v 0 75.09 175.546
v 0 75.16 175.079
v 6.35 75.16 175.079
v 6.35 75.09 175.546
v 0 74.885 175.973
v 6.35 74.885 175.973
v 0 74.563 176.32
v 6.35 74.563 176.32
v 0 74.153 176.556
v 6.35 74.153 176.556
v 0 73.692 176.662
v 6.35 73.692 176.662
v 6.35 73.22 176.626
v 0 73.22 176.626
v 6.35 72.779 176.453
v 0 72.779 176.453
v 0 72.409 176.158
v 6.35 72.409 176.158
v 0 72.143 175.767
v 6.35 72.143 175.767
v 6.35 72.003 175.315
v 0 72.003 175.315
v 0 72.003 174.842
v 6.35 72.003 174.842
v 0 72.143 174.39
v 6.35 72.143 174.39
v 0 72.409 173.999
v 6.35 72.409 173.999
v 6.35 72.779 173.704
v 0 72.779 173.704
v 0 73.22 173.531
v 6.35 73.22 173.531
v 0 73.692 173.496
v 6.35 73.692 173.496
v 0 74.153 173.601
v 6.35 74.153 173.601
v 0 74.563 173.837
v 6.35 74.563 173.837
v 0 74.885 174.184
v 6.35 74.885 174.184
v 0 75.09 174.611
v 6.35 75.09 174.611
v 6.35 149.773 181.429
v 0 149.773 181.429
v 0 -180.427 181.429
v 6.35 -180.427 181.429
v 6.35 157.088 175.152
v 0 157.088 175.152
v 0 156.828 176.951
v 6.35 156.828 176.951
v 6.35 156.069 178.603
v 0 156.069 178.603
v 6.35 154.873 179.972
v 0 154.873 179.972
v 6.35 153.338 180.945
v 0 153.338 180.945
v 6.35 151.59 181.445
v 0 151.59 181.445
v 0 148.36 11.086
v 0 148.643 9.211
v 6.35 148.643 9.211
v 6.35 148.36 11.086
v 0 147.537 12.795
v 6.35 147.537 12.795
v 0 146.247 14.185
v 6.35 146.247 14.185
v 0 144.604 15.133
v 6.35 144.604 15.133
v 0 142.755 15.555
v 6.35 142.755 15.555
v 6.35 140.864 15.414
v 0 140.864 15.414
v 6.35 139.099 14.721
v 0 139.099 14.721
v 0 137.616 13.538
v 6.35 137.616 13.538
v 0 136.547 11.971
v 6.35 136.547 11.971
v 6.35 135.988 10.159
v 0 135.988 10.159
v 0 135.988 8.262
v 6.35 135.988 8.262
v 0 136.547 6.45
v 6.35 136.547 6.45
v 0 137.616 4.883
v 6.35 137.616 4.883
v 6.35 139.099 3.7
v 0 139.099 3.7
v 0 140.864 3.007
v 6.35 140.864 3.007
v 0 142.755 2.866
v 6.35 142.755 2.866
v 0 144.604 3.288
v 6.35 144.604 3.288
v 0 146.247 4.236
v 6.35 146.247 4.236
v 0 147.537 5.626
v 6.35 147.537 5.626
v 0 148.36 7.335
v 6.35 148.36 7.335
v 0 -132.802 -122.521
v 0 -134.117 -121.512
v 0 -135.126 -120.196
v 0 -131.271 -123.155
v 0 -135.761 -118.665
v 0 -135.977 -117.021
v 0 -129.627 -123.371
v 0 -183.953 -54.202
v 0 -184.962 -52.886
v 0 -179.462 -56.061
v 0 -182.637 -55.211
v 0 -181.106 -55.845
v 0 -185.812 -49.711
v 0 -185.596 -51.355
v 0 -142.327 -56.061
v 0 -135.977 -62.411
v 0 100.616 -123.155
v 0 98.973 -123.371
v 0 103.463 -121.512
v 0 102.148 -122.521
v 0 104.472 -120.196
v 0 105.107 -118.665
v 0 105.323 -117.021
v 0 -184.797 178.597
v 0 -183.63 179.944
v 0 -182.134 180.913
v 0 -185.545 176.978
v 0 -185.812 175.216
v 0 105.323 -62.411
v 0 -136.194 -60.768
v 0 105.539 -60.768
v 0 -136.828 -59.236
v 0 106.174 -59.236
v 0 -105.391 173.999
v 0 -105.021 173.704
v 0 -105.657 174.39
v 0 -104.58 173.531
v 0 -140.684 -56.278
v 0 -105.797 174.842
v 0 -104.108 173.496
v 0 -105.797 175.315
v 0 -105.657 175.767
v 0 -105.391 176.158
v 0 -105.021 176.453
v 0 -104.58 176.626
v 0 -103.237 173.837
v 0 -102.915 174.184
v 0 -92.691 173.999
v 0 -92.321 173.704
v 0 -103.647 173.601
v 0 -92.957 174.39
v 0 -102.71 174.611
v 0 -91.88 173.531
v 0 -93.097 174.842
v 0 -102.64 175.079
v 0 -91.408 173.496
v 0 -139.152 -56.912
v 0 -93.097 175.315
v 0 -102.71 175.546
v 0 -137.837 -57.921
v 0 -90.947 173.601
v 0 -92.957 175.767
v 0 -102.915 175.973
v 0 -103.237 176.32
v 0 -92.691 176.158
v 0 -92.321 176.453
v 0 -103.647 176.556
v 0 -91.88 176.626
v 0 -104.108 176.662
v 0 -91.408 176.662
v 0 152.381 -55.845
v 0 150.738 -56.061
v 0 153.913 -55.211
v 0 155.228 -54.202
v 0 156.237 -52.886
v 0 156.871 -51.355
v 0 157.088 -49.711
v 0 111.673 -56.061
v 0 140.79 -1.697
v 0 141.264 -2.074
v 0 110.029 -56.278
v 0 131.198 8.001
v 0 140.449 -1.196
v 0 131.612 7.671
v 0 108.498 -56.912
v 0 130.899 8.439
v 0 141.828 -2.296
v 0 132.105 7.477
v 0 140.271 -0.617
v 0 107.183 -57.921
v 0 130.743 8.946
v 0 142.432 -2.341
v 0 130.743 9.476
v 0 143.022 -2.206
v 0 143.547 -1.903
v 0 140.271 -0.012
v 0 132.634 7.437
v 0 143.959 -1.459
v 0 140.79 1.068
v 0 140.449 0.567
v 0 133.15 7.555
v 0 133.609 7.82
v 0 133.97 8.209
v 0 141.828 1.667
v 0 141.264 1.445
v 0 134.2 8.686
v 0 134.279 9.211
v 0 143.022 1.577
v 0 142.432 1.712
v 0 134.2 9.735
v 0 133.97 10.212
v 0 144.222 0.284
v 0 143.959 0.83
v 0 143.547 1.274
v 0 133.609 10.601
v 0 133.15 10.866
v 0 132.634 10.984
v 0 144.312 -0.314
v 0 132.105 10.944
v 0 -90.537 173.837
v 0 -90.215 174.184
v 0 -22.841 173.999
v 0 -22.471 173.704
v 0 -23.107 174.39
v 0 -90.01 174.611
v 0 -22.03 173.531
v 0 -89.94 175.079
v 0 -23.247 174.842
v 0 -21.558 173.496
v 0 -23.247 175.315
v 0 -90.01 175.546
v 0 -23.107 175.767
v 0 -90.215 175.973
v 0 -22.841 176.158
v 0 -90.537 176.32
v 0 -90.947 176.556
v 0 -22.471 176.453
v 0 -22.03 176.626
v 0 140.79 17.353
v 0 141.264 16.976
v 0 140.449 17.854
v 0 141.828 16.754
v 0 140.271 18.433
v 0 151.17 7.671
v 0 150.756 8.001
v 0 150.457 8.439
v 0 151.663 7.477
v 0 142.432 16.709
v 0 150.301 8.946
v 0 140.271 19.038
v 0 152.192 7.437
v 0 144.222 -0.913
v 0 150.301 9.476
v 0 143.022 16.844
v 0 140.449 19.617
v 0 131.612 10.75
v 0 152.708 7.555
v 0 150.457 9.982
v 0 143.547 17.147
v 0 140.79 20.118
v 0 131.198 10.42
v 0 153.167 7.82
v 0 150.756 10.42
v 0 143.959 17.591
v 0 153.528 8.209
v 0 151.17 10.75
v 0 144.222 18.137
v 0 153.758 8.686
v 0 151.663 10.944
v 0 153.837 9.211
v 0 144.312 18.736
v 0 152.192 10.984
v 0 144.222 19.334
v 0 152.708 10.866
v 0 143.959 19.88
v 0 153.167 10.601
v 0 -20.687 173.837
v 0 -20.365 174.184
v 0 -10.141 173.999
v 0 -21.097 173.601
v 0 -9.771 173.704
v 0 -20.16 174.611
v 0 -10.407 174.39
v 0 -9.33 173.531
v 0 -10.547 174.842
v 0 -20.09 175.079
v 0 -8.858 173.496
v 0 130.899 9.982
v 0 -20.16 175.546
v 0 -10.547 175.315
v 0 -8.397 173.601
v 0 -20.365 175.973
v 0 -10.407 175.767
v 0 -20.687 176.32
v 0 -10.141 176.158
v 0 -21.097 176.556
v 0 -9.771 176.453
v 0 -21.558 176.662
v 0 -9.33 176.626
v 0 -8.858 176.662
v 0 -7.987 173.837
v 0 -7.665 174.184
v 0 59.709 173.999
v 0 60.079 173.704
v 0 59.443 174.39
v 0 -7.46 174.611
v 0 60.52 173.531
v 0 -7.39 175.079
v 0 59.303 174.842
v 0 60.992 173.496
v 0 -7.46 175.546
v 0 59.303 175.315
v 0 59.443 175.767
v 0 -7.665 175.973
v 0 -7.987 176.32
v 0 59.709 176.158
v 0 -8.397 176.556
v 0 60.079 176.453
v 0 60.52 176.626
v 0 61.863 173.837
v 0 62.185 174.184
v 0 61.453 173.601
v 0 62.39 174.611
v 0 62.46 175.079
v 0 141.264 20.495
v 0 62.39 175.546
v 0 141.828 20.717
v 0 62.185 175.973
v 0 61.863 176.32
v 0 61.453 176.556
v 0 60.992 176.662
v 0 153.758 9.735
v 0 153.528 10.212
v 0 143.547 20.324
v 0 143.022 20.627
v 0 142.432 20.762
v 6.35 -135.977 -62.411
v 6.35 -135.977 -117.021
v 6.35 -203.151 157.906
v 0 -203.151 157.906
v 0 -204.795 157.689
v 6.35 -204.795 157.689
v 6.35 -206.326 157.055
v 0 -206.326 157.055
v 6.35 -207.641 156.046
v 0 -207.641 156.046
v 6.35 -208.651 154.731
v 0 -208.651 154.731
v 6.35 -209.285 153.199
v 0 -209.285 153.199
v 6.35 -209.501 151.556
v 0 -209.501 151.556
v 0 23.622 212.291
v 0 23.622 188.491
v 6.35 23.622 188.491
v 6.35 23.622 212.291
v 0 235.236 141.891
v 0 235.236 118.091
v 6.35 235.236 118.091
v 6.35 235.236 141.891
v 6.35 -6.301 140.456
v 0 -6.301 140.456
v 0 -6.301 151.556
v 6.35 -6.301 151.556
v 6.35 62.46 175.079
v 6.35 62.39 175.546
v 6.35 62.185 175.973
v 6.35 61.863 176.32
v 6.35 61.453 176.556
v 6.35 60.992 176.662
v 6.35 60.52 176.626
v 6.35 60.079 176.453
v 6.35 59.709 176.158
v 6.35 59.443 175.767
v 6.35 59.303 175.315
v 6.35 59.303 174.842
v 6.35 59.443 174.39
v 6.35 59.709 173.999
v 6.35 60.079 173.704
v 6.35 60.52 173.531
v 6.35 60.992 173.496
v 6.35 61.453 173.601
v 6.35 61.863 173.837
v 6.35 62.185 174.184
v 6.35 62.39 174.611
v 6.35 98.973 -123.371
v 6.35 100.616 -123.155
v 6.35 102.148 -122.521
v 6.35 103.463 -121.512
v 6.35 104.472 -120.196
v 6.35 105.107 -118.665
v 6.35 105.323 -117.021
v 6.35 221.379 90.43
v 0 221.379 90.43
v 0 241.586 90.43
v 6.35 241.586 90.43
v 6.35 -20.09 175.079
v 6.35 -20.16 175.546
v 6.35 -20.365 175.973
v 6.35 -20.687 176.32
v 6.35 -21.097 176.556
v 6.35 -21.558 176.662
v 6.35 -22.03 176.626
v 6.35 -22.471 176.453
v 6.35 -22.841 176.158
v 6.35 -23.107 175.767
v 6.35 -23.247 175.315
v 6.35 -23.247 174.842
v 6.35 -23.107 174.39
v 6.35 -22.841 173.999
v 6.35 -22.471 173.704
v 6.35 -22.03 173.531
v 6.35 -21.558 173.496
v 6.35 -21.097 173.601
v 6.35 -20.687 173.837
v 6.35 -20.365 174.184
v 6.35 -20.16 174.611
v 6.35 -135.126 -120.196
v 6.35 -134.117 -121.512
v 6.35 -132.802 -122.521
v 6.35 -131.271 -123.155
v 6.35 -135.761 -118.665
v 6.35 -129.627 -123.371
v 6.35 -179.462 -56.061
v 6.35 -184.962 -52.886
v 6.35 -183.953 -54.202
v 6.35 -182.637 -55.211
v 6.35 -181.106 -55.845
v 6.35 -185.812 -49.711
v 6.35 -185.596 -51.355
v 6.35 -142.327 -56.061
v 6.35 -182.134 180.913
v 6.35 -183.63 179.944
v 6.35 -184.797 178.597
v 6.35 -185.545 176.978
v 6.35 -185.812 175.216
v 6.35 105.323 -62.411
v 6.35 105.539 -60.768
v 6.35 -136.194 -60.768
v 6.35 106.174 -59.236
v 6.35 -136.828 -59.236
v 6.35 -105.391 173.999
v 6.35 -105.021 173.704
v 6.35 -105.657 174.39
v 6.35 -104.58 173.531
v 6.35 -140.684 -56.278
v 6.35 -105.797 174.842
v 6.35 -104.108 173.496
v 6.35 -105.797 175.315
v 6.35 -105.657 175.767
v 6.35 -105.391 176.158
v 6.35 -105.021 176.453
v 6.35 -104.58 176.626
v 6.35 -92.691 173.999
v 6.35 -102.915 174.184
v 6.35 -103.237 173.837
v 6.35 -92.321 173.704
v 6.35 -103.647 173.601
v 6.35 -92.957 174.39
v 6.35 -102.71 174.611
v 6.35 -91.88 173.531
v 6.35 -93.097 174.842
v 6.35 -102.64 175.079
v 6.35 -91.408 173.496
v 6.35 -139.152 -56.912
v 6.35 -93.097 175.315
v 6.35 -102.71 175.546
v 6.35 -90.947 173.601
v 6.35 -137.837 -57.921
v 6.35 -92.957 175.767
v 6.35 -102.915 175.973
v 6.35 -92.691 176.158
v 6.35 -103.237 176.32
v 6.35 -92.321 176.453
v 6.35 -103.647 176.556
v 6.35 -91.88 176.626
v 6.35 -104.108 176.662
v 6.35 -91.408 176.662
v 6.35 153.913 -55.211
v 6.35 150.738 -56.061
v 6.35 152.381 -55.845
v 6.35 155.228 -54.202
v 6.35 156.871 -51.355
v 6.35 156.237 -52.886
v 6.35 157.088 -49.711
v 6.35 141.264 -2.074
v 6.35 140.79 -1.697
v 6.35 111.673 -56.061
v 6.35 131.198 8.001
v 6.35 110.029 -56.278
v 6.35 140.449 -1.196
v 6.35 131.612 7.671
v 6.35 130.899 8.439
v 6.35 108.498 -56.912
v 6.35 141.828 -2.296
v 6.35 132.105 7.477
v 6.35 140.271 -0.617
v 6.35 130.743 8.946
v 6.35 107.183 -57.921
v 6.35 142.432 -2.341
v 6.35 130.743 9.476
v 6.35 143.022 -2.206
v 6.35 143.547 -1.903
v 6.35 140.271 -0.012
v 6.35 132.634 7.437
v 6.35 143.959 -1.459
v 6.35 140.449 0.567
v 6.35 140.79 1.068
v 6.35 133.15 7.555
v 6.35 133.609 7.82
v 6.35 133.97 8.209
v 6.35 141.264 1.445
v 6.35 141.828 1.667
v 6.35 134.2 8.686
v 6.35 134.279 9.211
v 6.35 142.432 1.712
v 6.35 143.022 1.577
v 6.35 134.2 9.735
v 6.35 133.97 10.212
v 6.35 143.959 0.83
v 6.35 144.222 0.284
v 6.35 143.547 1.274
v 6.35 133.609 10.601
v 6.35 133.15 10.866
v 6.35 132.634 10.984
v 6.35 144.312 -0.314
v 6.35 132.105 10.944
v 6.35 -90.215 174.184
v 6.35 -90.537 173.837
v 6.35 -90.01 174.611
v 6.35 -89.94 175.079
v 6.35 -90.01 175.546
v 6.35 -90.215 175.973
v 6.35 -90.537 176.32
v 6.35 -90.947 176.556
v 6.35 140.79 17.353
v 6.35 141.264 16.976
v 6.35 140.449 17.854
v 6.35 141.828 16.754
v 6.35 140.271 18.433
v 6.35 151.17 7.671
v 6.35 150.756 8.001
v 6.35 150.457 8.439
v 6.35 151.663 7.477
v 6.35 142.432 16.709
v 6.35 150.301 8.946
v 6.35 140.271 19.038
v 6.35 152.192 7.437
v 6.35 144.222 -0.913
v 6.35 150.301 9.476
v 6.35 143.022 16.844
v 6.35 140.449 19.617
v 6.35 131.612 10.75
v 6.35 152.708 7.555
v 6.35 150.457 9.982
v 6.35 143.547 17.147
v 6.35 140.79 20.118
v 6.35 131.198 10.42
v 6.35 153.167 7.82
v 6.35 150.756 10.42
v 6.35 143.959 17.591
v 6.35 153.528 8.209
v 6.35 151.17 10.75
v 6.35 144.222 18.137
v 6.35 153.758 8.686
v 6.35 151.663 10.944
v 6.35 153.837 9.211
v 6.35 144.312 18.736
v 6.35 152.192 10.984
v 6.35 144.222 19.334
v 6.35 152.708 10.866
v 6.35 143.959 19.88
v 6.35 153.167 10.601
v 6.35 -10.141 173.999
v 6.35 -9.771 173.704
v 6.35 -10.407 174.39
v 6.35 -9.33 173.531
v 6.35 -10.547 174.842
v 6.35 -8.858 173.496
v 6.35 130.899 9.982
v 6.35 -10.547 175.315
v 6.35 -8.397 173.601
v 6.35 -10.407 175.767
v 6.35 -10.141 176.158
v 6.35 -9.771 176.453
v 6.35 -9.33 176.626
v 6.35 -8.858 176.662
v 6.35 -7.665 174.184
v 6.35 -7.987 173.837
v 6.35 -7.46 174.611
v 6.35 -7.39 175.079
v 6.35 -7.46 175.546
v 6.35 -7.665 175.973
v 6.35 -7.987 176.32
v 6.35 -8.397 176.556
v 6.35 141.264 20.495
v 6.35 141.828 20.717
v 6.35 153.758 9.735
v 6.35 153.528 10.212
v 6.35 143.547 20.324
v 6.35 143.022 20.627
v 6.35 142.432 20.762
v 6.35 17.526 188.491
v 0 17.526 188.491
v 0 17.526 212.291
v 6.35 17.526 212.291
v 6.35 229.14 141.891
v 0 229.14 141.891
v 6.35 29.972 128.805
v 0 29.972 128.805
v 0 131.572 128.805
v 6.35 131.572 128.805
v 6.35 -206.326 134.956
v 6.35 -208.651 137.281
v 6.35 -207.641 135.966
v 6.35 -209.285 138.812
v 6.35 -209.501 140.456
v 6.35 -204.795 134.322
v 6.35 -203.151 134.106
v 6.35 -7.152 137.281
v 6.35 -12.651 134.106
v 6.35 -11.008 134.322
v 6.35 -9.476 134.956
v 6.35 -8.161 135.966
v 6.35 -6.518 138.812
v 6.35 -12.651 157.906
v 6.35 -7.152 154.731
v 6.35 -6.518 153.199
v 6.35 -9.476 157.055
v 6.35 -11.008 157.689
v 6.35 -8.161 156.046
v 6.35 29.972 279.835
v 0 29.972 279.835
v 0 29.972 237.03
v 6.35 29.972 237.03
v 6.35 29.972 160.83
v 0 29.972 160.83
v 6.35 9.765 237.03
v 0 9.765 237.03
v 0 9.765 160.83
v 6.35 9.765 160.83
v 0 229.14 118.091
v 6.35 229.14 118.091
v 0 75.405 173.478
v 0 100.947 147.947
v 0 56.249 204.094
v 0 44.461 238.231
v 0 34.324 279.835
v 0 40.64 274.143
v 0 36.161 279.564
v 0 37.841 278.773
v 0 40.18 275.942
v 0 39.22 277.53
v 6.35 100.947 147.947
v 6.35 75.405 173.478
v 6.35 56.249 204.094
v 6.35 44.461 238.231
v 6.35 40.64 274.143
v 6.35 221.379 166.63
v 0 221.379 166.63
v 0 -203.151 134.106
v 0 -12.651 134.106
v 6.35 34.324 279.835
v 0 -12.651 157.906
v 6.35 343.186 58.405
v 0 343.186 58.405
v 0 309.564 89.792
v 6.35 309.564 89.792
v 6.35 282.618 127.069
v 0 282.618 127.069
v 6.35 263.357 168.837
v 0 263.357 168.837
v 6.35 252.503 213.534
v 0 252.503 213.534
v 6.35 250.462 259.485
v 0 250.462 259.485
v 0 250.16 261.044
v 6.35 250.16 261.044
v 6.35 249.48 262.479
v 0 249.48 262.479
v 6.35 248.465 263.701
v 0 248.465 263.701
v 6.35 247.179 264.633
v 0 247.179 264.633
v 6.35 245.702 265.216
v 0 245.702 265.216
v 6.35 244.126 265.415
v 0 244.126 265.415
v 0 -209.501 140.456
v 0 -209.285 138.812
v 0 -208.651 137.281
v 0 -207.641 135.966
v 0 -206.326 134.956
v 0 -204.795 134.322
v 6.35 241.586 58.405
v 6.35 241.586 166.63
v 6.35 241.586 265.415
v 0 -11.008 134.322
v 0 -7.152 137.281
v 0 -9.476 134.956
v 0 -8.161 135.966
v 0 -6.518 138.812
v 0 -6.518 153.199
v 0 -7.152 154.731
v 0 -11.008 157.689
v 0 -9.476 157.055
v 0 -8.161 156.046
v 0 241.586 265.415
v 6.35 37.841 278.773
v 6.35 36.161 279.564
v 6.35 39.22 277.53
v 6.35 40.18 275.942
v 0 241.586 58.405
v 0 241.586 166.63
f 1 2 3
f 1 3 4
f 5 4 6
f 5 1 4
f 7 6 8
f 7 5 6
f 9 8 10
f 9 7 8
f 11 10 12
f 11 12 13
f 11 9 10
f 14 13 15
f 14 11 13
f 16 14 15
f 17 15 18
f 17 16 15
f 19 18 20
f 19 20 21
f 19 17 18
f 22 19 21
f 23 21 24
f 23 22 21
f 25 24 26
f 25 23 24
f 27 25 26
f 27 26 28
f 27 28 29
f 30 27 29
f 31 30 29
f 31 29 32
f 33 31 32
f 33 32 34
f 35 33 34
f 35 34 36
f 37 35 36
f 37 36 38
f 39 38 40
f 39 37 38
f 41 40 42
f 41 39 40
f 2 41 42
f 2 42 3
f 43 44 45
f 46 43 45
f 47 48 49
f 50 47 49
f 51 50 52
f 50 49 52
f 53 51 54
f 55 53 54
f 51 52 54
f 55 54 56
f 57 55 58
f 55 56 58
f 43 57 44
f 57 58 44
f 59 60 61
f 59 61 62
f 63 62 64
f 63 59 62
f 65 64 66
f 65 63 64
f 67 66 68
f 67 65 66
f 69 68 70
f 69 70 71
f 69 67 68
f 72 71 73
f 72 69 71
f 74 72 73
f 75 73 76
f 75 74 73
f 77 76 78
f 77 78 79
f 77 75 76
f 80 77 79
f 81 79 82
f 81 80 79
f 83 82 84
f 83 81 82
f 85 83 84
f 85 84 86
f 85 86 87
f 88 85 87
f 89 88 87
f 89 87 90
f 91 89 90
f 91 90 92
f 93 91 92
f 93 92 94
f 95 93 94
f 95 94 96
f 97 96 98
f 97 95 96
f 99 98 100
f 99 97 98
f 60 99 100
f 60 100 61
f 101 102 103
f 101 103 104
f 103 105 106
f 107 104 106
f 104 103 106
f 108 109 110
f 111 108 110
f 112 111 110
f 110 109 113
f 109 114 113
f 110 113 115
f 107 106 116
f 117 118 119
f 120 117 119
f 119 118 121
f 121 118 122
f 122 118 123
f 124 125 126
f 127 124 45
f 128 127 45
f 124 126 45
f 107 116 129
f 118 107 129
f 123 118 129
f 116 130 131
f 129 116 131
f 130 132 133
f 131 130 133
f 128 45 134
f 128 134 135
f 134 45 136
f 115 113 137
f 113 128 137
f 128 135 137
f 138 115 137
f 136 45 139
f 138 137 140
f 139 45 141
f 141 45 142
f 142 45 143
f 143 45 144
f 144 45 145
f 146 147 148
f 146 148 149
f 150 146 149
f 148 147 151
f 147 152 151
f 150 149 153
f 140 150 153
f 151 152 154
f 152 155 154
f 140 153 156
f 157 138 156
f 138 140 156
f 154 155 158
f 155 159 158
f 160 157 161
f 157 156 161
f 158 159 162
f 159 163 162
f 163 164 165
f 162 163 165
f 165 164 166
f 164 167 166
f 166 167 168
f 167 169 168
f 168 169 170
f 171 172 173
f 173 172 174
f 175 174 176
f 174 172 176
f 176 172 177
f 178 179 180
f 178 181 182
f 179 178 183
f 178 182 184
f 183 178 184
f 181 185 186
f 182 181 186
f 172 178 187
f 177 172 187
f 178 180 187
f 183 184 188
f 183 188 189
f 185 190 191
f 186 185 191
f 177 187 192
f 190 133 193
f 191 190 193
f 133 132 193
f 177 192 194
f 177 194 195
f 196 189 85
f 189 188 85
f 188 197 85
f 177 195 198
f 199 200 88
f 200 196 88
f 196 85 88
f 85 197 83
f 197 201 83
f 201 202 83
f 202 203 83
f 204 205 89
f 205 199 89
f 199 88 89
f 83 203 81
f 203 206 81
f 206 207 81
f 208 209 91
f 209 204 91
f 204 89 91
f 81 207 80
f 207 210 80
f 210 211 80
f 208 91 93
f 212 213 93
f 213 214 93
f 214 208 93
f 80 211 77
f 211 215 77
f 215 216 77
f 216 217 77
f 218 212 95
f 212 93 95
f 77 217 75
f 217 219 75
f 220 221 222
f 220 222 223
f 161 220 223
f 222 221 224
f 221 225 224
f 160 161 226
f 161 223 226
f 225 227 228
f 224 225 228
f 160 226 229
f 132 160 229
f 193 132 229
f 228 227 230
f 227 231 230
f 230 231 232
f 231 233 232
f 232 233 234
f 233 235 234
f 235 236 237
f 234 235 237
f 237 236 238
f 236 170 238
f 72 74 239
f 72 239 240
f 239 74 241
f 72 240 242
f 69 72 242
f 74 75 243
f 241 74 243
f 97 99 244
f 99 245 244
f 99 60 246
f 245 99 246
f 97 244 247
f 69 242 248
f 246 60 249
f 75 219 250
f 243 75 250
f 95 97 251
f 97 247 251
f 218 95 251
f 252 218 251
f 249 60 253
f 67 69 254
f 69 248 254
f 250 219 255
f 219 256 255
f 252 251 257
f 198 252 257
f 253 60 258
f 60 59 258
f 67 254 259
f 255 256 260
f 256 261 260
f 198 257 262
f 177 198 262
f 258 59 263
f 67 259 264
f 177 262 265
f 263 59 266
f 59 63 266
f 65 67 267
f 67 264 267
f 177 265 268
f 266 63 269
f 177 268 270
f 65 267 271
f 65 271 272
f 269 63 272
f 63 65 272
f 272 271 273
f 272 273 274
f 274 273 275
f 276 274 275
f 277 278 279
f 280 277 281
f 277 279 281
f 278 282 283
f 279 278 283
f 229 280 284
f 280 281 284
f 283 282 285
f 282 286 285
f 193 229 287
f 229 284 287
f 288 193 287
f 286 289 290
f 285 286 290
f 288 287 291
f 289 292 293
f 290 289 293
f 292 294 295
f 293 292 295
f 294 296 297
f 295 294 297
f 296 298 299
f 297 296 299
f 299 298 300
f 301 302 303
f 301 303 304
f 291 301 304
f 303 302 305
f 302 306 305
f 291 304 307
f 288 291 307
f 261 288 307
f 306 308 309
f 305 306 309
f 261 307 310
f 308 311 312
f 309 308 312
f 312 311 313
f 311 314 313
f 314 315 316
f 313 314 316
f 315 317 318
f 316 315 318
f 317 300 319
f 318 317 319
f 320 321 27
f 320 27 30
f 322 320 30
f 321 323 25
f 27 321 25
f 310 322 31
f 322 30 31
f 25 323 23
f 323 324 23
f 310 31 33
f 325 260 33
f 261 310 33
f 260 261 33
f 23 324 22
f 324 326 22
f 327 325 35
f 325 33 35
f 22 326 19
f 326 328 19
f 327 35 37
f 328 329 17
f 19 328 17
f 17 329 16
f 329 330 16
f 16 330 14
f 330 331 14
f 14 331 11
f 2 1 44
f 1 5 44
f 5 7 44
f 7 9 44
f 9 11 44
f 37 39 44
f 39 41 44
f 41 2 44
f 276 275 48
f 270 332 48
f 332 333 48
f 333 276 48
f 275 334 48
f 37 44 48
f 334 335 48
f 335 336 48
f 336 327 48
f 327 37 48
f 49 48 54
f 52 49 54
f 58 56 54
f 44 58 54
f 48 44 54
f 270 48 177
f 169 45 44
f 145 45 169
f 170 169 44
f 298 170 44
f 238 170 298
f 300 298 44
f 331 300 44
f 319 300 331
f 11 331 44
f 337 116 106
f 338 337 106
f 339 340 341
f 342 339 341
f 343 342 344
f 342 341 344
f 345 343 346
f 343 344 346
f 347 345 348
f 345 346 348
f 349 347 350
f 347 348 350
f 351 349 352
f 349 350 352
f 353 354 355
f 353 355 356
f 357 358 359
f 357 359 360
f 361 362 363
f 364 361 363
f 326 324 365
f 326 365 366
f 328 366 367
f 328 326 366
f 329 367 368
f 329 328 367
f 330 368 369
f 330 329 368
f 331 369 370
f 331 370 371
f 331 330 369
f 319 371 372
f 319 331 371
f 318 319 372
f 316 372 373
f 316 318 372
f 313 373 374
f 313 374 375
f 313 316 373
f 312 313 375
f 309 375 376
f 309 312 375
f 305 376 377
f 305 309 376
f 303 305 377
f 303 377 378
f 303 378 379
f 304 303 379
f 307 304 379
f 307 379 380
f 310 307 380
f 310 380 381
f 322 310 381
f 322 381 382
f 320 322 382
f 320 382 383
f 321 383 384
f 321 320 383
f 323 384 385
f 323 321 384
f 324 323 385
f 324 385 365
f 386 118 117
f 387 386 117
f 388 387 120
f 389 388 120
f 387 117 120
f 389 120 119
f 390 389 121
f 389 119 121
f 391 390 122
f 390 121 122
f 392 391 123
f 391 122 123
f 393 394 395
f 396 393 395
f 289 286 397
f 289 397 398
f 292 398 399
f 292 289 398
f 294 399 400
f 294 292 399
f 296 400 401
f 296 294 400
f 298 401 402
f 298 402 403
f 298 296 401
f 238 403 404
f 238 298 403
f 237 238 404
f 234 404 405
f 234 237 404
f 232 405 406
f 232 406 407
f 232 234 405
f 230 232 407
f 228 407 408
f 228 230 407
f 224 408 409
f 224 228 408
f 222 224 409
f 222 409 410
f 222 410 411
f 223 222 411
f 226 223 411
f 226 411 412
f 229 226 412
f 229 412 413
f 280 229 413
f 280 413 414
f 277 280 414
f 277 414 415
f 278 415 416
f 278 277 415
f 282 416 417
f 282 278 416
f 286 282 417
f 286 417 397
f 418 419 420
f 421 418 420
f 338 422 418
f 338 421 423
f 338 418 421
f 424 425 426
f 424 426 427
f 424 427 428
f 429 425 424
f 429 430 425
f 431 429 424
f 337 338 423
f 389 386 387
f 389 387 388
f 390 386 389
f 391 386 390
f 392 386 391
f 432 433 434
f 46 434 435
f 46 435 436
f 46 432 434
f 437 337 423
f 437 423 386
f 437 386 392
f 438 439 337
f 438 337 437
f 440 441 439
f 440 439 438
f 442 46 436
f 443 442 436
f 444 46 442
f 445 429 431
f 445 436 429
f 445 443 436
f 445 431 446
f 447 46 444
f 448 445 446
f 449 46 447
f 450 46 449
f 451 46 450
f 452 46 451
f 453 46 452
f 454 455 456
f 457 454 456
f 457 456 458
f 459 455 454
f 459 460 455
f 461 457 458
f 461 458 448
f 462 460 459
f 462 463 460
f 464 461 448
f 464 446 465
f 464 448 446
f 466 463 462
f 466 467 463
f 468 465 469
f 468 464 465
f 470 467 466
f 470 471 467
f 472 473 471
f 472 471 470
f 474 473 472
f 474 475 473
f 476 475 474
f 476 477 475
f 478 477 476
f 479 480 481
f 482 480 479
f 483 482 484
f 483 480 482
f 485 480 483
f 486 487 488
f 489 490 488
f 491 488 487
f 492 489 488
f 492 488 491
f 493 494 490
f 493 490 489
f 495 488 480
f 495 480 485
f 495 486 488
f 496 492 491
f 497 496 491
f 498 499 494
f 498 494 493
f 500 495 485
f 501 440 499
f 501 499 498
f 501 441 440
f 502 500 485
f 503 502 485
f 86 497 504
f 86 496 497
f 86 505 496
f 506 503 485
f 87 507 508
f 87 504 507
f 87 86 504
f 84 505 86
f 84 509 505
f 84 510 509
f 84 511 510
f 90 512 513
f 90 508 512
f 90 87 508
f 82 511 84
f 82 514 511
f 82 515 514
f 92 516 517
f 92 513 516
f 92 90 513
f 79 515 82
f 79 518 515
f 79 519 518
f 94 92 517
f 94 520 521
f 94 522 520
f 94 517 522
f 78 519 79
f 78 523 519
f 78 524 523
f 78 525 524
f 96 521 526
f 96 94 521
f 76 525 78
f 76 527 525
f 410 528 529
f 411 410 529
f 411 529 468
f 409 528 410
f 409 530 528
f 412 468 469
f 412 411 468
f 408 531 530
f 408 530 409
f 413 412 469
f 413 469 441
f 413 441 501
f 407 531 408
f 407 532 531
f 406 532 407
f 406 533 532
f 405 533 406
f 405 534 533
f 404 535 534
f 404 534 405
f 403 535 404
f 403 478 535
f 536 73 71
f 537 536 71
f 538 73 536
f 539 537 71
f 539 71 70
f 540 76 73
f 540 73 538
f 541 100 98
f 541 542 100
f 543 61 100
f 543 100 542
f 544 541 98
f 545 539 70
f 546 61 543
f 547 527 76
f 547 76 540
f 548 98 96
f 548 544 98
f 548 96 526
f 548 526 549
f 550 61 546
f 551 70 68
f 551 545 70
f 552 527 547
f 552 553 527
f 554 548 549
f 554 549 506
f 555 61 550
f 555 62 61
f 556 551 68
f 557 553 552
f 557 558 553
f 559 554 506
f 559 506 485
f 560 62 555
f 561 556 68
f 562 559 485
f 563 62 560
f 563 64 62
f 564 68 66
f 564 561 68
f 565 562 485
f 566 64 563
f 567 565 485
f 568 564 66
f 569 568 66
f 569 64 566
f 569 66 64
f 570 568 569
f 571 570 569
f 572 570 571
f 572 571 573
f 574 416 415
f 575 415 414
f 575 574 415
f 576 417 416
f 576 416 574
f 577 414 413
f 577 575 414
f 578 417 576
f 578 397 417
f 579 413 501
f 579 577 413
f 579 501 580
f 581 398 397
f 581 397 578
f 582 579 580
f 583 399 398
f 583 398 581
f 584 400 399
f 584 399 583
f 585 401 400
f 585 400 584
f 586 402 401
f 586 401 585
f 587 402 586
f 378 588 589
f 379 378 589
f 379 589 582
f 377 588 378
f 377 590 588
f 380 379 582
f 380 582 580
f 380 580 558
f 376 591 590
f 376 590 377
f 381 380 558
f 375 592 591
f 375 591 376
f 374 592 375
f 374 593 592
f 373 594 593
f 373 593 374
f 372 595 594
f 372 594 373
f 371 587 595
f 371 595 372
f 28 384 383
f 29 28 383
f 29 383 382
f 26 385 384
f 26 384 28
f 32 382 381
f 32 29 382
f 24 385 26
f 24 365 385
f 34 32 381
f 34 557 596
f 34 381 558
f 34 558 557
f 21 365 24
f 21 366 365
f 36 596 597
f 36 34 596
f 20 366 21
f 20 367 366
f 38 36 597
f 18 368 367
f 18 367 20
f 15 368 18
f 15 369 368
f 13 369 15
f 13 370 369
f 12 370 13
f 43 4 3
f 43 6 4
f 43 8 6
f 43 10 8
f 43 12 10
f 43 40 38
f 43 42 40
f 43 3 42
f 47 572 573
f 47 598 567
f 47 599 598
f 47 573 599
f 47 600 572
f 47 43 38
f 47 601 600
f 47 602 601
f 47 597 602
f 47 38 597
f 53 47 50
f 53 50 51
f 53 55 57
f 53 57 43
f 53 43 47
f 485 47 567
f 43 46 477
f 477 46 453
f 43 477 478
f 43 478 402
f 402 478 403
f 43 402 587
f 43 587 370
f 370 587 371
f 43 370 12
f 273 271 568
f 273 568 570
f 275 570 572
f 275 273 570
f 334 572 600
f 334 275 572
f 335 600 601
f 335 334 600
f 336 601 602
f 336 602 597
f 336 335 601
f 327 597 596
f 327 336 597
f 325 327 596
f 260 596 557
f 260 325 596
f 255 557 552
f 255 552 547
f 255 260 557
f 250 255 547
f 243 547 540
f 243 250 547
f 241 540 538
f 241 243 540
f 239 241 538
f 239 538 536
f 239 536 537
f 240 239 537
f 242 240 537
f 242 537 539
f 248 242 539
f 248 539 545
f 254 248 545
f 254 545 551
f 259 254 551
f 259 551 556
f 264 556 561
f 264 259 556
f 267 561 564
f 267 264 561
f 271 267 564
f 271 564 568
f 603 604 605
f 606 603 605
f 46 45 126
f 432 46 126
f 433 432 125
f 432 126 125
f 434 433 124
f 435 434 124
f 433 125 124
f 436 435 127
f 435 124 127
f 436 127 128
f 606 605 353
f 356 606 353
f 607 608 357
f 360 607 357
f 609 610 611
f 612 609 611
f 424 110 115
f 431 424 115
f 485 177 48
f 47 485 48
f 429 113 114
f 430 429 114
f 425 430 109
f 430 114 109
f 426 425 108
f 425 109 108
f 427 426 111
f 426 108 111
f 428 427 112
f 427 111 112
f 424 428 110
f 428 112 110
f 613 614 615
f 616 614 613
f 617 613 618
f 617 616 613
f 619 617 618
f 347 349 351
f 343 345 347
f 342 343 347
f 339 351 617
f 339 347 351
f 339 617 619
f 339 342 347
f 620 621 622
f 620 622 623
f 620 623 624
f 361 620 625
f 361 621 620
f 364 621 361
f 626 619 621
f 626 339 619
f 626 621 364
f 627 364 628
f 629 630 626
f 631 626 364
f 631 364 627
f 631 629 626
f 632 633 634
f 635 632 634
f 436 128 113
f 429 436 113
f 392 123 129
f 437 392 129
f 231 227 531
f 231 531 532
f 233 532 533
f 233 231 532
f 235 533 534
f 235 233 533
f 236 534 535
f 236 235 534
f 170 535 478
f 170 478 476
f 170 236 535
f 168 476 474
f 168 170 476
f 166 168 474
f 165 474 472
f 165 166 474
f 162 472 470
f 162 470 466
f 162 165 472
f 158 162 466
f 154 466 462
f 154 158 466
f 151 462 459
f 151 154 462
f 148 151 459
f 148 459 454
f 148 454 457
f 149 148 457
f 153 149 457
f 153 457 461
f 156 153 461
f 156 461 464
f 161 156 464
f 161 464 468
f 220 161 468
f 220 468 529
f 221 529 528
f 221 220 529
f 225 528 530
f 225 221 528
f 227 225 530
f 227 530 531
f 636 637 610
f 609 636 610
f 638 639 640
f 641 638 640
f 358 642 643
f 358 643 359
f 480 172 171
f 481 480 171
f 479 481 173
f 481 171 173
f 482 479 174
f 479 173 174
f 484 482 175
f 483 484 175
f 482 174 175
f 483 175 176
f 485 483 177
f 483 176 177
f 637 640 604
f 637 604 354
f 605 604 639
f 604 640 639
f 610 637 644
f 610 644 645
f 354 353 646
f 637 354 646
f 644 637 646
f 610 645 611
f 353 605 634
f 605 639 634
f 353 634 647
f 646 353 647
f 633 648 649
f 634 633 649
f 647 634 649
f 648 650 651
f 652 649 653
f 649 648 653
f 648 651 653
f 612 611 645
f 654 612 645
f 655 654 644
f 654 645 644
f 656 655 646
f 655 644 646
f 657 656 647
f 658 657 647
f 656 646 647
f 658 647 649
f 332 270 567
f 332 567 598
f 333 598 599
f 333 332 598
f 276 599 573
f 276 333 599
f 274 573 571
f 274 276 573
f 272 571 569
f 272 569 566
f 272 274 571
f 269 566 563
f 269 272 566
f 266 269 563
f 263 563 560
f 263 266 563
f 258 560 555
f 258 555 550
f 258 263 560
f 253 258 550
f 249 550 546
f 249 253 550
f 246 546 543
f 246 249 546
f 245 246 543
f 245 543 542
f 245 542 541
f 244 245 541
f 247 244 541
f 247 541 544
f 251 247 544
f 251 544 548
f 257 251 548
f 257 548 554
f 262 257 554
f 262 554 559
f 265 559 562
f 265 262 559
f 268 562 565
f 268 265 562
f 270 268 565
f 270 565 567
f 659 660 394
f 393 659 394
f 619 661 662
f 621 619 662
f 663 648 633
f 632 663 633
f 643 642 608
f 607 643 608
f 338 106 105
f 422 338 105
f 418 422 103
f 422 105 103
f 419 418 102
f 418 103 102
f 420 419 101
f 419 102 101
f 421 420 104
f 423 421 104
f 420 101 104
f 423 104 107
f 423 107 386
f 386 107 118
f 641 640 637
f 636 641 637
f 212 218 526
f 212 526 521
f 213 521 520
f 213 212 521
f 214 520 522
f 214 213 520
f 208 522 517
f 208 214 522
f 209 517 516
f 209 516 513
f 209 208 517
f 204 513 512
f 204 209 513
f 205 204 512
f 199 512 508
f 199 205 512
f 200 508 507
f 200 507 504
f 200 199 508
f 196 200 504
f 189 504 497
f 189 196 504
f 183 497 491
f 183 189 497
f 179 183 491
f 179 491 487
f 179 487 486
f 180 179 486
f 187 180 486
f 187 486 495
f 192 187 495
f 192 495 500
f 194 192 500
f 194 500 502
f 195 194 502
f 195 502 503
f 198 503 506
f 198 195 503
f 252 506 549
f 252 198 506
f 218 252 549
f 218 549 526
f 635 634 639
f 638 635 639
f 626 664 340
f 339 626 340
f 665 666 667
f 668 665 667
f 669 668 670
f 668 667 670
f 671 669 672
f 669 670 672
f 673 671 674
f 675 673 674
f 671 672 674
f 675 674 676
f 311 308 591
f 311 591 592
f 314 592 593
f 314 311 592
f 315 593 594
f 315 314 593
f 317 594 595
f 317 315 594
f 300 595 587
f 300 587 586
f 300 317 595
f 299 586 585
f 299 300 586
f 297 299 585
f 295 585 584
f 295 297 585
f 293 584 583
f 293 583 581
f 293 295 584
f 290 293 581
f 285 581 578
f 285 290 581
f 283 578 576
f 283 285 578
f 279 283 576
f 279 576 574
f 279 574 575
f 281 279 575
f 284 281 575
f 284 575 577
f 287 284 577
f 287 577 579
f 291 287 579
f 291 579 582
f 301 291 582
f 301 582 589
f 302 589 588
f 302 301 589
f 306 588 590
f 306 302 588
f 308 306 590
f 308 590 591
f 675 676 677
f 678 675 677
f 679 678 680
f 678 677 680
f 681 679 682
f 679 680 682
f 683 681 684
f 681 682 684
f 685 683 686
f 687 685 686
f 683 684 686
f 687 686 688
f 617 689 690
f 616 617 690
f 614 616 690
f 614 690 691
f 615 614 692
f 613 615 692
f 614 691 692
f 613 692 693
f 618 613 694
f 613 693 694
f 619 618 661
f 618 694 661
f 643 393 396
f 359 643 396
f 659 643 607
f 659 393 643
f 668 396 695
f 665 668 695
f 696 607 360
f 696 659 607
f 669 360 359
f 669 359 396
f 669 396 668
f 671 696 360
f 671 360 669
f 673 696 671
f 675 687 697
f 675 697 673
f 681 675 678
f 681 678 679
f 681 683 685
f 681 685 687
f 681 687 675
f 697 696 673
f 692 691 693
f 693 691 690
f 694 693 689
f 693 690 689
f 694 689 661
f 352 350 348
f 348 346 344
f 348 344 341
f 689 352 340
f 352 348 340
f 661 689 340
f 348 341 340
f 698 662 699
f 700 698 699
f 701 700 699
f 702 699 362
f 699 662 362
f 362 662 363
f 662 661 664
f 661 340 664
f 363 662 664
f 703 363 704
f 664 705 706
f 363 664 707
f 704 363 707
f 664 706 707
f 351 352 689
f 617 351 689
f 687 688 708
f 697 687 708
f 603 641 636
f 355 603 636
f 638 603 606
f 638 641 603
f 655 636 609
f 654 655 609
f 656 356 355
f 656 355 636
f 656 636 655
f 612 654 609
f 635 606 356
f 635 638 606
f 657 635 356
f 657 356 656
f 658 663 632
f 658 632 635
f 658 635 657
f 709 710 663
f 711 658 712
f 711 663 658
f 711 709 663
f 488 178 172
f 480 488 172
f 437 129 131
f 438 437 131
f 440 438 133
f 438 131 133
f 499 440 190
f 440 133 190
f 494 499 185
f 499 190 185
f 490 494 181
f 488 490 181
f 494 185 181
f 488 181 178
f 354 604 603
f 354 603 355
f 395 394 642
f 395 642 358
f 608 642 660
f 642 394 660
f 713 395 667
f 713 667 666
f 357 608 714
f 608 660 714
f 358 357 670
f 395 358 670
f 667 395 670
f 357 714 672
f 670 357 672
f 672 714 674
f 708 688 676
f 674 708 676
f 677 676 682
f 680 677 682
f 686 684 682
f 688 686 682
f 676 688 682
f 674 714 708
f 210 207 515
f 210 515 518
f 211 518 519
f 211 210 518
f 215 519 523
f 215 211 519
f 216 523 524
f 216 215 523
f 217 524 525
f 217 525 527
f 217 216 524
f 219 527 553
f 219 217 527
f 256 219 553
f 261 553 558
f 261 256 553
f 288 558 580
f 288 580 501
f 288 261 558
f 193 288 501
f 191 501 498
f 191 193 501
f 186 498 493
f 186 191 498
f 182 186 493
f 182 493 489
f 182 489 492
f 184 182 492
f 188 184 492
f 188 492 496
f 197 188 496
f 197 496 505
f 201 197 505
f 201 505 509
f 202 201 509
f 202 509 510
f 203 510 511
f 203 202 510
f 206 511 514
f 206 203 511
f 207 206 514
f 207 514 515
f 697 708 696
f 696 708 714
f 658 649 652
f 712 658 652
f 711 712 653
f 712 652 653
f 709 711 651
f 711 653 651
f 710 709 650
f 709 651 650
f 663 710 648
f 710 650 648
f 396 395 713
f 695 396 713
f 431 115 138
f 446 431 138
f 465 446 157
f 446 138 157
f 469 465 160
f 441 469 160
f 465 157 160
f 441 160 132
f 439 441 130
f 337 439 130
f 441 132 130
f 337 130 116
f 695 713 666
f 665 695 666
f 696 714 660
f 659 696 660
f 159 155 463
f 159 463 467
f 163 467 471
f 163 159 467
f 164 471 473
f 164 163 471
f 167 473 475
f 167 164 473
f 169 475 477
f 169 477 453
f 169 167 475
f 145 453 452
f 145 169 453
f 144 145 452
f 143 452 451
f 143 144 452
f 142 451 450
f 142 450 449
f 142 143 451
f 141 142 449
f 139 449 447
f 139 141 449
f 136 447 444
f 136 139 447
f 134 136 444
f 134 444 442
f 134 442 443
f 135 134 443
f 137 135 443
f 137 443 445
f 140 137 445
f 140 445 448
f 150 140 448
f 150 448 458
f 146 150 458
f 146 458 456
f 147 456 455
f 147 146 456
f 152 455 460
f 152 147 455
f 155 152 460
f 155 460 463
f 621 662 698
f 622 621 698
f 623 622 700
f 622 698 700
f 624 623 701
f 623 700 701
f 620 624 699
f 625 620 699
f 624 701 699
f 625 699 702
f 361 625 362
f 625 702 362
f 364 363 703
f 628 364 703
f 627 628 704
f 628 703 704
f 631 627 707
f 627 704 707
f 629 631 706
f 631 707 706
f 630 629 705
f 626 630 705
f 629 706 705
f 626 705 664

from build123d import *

# Parameters (mm, degrees)
F0_R     = 1.778
F0_R_2   = 2.032
F0_R_3   = 6.3627
F0_R_4   = 1.5875
F1_DEPTH = 6.35
F2_W     = 6.096
F2_H     = 23.7998
F3_DEPTH = 6.35
F5_DEPTH = 6.35
F6_W     = 6.096
F6_H     = 23.7998
F7_DEPTH = 6.35


with BuildPart() as f1:
    # F0 (on Right) → F1 (new body)
    with BuildSketch(Plane.YZ):
        with BuildLine():
            Line((-15.327098, 181.428571), (-180.427112, 181.428571))
            ThreePointArc((-180.427112, 181.428571), (-184.260948, 179.311576), (-185.812477, 175.216124))
            Line((-185.812477, 175.216124), (-185.812477, -49.711429))
            ThreePointArc((-185.812477, -49.711429), (-183.952605, -54.201557), (-179.462477, -56.061429))
            Line((-179.462477, -56.061429), (-142.327137, -56.061429))
            ThreePointArc((-142.327137, -56.061429), (-137.837009, -57.921301), (-135.977137, -62.411429))
            Line((-135.977137, -62.411429), (-135.977137, -117.021429))
            ThreePointArc((-135.977137, -117.021429), (-134.117265, -121.511557), (-129.627137, -123.371429))
            Line((-129.627137, -123.371429), (98.972916, -123.371429))
            ThreePointArc((98.972916, -123.371429), (103.463045, -121.511557), (105.322916, -117.021429))
            Line((105.322916, -117.021429), (105.322916, -62.411429))
            ThreePointArc((105.322916, -62.411429), (107.182788, -57.921301), (111.672916, -56.061429))
            Line((111.672916, -56.061429), (150.7378, -56.061429))
            ThreePointArc((150.7378, -56.061429), (155.227928, -54.201557), (157.0878, -49.711429))
            Line((157.0878, -49.711429), (157.0878, 175.152307))
            ThreePointArc((157.0878, 175.152307), (154.872742, 179.971514), (149.772916, 181.428571))
            Line((149.772916, 181.428571), (-15.327098, 181.428571))
        make_face()
        with Locations((132.500917, 9.210513)):
            Circle(F0_R, mode=Mode.SUBTRACT)
        with Locations((142.279917, -0.314487)):
            Circle(F0_R_2, mode=Mode.SUBTRACT)
        with Locations((142.279917, 9.210513)):
            Circle(F0_R_3, mode=Mode.SUBTRACT)
        with Locations((152.058917, 9.210513)):
            Circle(F0_R, mode=Mode.SUBTRACT)
        with Locations((142.279917, 18.735513)):
            Circle(F0_R_2, mode=Mode.SUBTRACT)
        with Locations((-104.227105, 175.078571)):
            Circle(F0_R_4, mode=Mode.SUBTRACT)
        with Locations((-91.527105, 175.078571)):
            Circle(F0_R_4, mode=Mode.SUBTRACT)
        with Locations((-21.677098, 175.078571)):
            Circle(F0_R_4, mode=Mode.SUBTRACT)
        with Locations((-8.977098, 175.078571)):
            Circle(F0_R_4, mode=Mode.SUBTRACT)
        with Locations((60.872909, 175.078571)):
            Circle(F0_R_4, mode=Mode.SUBTRACT)
        with Locations((73.572909, 175.078571)):
            Circle(F0_R_4, mode=Mode.SUBTRACT)
    extrude(amount=F1_DEPTH)


with BuildPart() as f3:
    # F2 (on Right) → F3 (new body)
    with BuildSketch(Plane.YZ):
        with BuildLine():
            Line((9.765309, 160.830349), (29.972, 160.830349))
            Line((29.972, 160.830349), (29.972, 154.204835))
            Line((29.972, 154.204835), (29.972, 128.804835))
            Line((29.972, 128.804835), (131.572, 128.804835))
            ThreePointArc((131.572, 128.804835), (64.95914, 188.243112), (40.640326, 274.142922))
            ThreePointArc((40.640326, 274.142922), (38.575786, 278.202319), (34.324452, 279.83547))
            Line((34.324452, 279.83547), (29.972, 279.83547))
            Line((29.972, 279.83547), (29.972, 237.030349))
            Line((29.972, 237.030349), (9.765309, 237.030349))
            Line((9.765309, 237.030349), (9.765309, 160.830349))
        make_face()
        with Locations((20.574, 200.3909)):
            Rectangle(F2_W, F2_H, mode=Mode.SUBTRACT)
    extrude(amount=F3_DEPTH)


with BuildPart() as f5:
    # F4 (on Right) → F5 (new body)
    with BuildSketch(Plane.YZ):
        with BuildLine():
            Line((-12.651345, 157.905535), (-203.151345, 157.905535))
            ThreePointArc((-203.151345, 157.905535), (-207.641473, 156.045663), (-209.501345, 151.555535))
            Line((-209.501345, 151.555535), (-209.501345, 140.455735))
            ThreePointArc((-209.501345, 140.455735), (-207.641473, 135.965606), (-203.151345, 134.105735))
            Line((-203.151345, 134.105735), (-12.651345, 134.105735))
            ThreePointArc((-12.651345, 134.105735), (-8.161217, 135.965606), (-6.301345, 140.455735))
            Line((-6.301345, 140.455735), (-6.301345, 151.555535))
            ThreePointArc((-6.301345, 151.555535), (-8.161217, 156.045663), (-12.651345, 157.905535))
        make_face()
    extrude(amount=F5_DEPTH)


with BuildPart() as f7:
    # F6 (on Right) → F7 (new body)
    with BuildSketch(Plane.YZ):
        with BuildLine():
            Line((244.12591, 265.414801), (241.58591, 265.414801))
            Line((241.58591, 265.414801), (241.58591, 166.630315))
            Line((241.58591, 166.630315), (221.379224, 166.630315))
            Line((221.379224, 166.630315), (221.379224, 90.430315))
            Line((221.379224, 90.430315), (241.58591, 90.430315))
            Line((241.58591, 90.430315), (241.58591, 83.804801))
            Line((241.58591, 83.804801), (241.58591, 58.404801))
            Line((241.58591, 58.404801), (343.18591, 58.404801))
            ThreePointArc((343.18591, 58.404801), (271.974436, 147.485933), (250.462008, 259.484761))
            ThreePointArc((250.462008, 259.484761), (248.46502, 263.70103), (244.12591, 265.414801))
        make_face()
        with Locations((232.18791, 129.990857)):
            Rectangle(F6_W, F6_H, mode=Mode.SUBTRACT)
    extrude(amount=F7_DEPTH)


solid = Compound([f1.part, f3.part, f5.part, f7.part])
